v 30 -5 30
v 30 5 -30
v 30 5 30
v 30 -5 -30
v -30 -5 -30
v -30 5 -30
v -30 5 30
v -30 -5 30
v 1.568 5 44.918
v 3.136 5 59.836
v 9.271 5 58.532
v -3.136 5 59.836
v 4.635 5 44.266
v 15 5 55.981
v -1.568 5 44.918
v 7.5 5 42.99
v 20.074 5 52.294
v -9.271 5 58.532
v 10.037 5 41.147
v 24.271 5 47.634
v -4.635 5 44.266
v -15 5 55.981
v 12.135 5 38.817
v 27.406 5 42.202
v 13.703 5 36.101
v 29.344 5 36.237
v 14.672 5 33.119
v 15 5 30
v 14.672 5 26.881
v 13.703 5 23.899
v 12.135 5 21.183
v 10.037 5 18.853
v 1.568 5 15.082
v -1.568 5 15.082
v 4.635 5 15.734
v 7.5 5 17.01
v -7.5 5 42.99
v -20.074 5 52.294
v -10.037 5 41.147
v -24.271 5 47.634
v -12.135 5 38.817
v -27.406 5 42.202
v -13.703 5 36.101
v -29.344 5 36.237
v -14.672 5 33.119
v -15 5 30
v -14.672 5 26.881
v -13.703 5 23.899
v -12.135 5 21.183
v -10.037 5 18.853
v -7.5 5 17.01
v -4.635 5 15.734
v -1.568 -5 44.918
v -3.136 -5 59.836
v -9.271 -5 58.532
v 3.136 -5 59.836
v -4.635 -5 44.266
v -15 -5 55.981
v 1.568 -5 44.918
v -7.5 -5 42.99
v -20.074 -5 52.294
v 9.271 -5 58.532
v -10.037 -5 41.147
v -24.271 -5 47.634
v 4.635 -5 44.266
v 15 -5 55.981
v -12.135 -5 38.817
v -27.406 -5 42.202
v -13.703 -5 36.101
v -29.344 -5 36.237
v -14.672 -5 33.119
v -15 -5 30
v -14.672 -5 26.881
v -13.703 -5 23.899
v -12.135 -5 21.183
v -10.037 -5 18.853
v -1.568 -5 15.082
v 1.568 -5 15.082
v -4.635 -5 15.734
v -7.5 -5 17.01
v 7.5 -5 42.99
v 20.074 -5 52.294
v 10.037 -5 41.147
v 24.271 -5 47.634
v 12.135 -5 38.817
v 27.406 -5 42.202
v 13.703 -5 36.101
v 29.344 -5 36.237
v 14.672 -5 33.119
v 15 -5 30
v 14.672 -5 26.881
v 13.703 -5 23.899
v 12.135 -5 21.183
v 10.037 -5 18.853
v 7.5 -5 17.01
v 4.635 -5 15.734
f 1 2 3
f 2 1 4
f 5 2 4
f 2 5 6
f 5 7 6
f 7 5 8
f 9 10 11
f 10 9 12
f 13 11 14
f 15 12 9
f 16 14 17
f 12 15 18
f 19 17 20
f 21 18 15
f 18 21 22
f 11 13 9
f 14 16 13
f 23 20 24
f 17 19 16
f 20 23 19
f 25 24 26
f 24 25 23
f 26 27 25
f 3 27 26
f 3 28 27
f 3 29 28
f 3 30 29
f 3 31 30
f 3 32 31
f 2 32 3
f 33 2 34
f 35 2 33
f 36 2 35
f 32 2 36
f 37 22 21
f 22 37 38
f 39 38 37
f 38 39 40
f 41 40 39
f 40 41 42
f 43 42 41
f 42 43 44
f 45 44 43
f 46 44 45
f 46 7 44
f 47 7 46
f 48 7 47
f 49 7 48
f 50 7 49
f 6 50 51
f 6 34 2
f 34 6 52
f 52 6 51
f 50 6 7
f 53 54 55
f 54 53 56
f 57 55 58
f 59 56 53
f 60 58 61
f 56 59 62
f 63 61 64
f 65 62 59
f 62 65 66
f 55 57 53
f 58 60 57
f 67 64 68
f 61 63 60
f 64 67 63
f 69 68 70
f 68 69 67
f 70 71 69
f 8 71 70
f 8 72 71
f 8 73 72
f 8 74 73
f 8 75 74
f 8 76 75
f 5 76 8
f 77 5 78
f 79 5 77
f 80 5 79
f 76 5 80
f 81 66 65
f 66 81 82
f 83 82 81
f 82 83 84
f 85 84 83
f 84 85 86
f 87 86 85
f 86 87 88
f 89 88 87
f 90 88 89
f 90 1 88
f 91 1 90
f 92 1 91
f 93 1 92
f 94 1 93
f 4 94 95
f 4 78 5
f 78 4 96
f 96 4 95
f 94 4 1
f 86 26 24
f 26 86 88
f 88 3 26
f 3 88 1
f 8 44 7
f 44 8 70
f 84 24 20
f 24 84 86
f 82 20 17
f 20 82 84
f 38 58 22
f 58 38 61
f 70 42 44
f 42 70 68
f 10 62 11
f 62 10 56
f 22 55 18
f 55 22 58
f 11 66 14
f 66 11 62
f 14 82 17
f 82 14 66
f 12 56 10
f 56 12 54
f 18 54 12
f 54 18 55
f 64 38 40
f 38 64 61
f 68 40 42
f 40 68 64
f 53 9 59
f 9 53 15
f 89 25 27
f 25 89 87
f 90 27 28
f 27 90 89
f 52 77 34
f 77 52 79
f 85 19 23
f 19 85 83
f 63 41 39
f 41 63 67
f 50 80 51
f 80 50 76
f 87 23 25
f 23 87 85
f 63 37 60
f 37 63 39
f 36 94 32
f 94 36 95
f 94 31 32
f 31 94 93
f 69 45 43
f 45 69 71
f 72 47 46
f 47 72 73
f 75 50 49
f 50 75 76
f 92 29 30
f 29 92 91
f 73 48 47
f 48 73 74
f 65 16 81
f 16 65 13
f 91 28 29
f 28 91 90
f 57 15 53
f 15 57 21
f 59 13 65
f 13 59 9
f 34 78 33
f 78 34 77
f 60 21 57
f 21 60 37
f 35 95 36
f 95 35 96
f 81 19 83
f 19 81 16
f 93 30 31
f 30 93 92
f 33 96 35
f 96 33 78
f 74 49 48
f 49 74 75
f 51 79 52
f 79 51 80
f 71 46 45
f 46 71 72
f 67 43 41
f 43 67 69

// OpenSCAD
module Eyebolt(){

    module pieno(){
        cube([60,10,60], center =true);

        translate([0,0,30])
        rotate([90,0,0])
        cylinder(10,30,30,$fn=30,center=true);
    }

    color("#a8b0b2")
    difference(){

    pieno();

    translate([0,0,30])
    rotate([90,0,0])
    cylinder(12,15,15,$fn=30,center=true);
    }

}

Eyebolt();

// Written by Nicolì Angelo (Gengio) 2024: 
// MIT License

//Permission is hereby granted, free of charge, to any person obtaining a copy of this software and associated documentation files (the "Software"), to deal in the Software without restriction, including without limitation the rights to use, copy, modify, merge, publish, distribute, sublicense, and/or sell copies of the Software, and to permit persons to whom the Software is furnished to do so, subject to the following conditions:

//The above copyright notice and this permission notice shall be included in all copies or substantial portions of the Software.

//THE SOFTWARE IS PROVIDED "AS IS", WITHOUT WARRANTY OF ANY KIND, EXPRESS OR IMPLIED, INCLUDING BUT NOT LIMITED TO THE WARRANTIES OF MERCHANTABILITY, FITNESS FOR A PARTICULAR PURPOSE AND NONINFRINGEMENT. IN NO EVENT SHALL THE AUTHORS OR COPYRIGHT HOLDERS BE LIABLE FOR ANY CLAIM, DAMAGES OR OTHER LIABILITY, WHETHER IN AN ACTION OF CONTRACT, TORT OR OTHERWISE, ARISING FROM, OUT OF OR IN CONNECTION WITH THE SOFTWARE OR THE USE OR OTHER DEALINGS IN THE SOFTWARE.
